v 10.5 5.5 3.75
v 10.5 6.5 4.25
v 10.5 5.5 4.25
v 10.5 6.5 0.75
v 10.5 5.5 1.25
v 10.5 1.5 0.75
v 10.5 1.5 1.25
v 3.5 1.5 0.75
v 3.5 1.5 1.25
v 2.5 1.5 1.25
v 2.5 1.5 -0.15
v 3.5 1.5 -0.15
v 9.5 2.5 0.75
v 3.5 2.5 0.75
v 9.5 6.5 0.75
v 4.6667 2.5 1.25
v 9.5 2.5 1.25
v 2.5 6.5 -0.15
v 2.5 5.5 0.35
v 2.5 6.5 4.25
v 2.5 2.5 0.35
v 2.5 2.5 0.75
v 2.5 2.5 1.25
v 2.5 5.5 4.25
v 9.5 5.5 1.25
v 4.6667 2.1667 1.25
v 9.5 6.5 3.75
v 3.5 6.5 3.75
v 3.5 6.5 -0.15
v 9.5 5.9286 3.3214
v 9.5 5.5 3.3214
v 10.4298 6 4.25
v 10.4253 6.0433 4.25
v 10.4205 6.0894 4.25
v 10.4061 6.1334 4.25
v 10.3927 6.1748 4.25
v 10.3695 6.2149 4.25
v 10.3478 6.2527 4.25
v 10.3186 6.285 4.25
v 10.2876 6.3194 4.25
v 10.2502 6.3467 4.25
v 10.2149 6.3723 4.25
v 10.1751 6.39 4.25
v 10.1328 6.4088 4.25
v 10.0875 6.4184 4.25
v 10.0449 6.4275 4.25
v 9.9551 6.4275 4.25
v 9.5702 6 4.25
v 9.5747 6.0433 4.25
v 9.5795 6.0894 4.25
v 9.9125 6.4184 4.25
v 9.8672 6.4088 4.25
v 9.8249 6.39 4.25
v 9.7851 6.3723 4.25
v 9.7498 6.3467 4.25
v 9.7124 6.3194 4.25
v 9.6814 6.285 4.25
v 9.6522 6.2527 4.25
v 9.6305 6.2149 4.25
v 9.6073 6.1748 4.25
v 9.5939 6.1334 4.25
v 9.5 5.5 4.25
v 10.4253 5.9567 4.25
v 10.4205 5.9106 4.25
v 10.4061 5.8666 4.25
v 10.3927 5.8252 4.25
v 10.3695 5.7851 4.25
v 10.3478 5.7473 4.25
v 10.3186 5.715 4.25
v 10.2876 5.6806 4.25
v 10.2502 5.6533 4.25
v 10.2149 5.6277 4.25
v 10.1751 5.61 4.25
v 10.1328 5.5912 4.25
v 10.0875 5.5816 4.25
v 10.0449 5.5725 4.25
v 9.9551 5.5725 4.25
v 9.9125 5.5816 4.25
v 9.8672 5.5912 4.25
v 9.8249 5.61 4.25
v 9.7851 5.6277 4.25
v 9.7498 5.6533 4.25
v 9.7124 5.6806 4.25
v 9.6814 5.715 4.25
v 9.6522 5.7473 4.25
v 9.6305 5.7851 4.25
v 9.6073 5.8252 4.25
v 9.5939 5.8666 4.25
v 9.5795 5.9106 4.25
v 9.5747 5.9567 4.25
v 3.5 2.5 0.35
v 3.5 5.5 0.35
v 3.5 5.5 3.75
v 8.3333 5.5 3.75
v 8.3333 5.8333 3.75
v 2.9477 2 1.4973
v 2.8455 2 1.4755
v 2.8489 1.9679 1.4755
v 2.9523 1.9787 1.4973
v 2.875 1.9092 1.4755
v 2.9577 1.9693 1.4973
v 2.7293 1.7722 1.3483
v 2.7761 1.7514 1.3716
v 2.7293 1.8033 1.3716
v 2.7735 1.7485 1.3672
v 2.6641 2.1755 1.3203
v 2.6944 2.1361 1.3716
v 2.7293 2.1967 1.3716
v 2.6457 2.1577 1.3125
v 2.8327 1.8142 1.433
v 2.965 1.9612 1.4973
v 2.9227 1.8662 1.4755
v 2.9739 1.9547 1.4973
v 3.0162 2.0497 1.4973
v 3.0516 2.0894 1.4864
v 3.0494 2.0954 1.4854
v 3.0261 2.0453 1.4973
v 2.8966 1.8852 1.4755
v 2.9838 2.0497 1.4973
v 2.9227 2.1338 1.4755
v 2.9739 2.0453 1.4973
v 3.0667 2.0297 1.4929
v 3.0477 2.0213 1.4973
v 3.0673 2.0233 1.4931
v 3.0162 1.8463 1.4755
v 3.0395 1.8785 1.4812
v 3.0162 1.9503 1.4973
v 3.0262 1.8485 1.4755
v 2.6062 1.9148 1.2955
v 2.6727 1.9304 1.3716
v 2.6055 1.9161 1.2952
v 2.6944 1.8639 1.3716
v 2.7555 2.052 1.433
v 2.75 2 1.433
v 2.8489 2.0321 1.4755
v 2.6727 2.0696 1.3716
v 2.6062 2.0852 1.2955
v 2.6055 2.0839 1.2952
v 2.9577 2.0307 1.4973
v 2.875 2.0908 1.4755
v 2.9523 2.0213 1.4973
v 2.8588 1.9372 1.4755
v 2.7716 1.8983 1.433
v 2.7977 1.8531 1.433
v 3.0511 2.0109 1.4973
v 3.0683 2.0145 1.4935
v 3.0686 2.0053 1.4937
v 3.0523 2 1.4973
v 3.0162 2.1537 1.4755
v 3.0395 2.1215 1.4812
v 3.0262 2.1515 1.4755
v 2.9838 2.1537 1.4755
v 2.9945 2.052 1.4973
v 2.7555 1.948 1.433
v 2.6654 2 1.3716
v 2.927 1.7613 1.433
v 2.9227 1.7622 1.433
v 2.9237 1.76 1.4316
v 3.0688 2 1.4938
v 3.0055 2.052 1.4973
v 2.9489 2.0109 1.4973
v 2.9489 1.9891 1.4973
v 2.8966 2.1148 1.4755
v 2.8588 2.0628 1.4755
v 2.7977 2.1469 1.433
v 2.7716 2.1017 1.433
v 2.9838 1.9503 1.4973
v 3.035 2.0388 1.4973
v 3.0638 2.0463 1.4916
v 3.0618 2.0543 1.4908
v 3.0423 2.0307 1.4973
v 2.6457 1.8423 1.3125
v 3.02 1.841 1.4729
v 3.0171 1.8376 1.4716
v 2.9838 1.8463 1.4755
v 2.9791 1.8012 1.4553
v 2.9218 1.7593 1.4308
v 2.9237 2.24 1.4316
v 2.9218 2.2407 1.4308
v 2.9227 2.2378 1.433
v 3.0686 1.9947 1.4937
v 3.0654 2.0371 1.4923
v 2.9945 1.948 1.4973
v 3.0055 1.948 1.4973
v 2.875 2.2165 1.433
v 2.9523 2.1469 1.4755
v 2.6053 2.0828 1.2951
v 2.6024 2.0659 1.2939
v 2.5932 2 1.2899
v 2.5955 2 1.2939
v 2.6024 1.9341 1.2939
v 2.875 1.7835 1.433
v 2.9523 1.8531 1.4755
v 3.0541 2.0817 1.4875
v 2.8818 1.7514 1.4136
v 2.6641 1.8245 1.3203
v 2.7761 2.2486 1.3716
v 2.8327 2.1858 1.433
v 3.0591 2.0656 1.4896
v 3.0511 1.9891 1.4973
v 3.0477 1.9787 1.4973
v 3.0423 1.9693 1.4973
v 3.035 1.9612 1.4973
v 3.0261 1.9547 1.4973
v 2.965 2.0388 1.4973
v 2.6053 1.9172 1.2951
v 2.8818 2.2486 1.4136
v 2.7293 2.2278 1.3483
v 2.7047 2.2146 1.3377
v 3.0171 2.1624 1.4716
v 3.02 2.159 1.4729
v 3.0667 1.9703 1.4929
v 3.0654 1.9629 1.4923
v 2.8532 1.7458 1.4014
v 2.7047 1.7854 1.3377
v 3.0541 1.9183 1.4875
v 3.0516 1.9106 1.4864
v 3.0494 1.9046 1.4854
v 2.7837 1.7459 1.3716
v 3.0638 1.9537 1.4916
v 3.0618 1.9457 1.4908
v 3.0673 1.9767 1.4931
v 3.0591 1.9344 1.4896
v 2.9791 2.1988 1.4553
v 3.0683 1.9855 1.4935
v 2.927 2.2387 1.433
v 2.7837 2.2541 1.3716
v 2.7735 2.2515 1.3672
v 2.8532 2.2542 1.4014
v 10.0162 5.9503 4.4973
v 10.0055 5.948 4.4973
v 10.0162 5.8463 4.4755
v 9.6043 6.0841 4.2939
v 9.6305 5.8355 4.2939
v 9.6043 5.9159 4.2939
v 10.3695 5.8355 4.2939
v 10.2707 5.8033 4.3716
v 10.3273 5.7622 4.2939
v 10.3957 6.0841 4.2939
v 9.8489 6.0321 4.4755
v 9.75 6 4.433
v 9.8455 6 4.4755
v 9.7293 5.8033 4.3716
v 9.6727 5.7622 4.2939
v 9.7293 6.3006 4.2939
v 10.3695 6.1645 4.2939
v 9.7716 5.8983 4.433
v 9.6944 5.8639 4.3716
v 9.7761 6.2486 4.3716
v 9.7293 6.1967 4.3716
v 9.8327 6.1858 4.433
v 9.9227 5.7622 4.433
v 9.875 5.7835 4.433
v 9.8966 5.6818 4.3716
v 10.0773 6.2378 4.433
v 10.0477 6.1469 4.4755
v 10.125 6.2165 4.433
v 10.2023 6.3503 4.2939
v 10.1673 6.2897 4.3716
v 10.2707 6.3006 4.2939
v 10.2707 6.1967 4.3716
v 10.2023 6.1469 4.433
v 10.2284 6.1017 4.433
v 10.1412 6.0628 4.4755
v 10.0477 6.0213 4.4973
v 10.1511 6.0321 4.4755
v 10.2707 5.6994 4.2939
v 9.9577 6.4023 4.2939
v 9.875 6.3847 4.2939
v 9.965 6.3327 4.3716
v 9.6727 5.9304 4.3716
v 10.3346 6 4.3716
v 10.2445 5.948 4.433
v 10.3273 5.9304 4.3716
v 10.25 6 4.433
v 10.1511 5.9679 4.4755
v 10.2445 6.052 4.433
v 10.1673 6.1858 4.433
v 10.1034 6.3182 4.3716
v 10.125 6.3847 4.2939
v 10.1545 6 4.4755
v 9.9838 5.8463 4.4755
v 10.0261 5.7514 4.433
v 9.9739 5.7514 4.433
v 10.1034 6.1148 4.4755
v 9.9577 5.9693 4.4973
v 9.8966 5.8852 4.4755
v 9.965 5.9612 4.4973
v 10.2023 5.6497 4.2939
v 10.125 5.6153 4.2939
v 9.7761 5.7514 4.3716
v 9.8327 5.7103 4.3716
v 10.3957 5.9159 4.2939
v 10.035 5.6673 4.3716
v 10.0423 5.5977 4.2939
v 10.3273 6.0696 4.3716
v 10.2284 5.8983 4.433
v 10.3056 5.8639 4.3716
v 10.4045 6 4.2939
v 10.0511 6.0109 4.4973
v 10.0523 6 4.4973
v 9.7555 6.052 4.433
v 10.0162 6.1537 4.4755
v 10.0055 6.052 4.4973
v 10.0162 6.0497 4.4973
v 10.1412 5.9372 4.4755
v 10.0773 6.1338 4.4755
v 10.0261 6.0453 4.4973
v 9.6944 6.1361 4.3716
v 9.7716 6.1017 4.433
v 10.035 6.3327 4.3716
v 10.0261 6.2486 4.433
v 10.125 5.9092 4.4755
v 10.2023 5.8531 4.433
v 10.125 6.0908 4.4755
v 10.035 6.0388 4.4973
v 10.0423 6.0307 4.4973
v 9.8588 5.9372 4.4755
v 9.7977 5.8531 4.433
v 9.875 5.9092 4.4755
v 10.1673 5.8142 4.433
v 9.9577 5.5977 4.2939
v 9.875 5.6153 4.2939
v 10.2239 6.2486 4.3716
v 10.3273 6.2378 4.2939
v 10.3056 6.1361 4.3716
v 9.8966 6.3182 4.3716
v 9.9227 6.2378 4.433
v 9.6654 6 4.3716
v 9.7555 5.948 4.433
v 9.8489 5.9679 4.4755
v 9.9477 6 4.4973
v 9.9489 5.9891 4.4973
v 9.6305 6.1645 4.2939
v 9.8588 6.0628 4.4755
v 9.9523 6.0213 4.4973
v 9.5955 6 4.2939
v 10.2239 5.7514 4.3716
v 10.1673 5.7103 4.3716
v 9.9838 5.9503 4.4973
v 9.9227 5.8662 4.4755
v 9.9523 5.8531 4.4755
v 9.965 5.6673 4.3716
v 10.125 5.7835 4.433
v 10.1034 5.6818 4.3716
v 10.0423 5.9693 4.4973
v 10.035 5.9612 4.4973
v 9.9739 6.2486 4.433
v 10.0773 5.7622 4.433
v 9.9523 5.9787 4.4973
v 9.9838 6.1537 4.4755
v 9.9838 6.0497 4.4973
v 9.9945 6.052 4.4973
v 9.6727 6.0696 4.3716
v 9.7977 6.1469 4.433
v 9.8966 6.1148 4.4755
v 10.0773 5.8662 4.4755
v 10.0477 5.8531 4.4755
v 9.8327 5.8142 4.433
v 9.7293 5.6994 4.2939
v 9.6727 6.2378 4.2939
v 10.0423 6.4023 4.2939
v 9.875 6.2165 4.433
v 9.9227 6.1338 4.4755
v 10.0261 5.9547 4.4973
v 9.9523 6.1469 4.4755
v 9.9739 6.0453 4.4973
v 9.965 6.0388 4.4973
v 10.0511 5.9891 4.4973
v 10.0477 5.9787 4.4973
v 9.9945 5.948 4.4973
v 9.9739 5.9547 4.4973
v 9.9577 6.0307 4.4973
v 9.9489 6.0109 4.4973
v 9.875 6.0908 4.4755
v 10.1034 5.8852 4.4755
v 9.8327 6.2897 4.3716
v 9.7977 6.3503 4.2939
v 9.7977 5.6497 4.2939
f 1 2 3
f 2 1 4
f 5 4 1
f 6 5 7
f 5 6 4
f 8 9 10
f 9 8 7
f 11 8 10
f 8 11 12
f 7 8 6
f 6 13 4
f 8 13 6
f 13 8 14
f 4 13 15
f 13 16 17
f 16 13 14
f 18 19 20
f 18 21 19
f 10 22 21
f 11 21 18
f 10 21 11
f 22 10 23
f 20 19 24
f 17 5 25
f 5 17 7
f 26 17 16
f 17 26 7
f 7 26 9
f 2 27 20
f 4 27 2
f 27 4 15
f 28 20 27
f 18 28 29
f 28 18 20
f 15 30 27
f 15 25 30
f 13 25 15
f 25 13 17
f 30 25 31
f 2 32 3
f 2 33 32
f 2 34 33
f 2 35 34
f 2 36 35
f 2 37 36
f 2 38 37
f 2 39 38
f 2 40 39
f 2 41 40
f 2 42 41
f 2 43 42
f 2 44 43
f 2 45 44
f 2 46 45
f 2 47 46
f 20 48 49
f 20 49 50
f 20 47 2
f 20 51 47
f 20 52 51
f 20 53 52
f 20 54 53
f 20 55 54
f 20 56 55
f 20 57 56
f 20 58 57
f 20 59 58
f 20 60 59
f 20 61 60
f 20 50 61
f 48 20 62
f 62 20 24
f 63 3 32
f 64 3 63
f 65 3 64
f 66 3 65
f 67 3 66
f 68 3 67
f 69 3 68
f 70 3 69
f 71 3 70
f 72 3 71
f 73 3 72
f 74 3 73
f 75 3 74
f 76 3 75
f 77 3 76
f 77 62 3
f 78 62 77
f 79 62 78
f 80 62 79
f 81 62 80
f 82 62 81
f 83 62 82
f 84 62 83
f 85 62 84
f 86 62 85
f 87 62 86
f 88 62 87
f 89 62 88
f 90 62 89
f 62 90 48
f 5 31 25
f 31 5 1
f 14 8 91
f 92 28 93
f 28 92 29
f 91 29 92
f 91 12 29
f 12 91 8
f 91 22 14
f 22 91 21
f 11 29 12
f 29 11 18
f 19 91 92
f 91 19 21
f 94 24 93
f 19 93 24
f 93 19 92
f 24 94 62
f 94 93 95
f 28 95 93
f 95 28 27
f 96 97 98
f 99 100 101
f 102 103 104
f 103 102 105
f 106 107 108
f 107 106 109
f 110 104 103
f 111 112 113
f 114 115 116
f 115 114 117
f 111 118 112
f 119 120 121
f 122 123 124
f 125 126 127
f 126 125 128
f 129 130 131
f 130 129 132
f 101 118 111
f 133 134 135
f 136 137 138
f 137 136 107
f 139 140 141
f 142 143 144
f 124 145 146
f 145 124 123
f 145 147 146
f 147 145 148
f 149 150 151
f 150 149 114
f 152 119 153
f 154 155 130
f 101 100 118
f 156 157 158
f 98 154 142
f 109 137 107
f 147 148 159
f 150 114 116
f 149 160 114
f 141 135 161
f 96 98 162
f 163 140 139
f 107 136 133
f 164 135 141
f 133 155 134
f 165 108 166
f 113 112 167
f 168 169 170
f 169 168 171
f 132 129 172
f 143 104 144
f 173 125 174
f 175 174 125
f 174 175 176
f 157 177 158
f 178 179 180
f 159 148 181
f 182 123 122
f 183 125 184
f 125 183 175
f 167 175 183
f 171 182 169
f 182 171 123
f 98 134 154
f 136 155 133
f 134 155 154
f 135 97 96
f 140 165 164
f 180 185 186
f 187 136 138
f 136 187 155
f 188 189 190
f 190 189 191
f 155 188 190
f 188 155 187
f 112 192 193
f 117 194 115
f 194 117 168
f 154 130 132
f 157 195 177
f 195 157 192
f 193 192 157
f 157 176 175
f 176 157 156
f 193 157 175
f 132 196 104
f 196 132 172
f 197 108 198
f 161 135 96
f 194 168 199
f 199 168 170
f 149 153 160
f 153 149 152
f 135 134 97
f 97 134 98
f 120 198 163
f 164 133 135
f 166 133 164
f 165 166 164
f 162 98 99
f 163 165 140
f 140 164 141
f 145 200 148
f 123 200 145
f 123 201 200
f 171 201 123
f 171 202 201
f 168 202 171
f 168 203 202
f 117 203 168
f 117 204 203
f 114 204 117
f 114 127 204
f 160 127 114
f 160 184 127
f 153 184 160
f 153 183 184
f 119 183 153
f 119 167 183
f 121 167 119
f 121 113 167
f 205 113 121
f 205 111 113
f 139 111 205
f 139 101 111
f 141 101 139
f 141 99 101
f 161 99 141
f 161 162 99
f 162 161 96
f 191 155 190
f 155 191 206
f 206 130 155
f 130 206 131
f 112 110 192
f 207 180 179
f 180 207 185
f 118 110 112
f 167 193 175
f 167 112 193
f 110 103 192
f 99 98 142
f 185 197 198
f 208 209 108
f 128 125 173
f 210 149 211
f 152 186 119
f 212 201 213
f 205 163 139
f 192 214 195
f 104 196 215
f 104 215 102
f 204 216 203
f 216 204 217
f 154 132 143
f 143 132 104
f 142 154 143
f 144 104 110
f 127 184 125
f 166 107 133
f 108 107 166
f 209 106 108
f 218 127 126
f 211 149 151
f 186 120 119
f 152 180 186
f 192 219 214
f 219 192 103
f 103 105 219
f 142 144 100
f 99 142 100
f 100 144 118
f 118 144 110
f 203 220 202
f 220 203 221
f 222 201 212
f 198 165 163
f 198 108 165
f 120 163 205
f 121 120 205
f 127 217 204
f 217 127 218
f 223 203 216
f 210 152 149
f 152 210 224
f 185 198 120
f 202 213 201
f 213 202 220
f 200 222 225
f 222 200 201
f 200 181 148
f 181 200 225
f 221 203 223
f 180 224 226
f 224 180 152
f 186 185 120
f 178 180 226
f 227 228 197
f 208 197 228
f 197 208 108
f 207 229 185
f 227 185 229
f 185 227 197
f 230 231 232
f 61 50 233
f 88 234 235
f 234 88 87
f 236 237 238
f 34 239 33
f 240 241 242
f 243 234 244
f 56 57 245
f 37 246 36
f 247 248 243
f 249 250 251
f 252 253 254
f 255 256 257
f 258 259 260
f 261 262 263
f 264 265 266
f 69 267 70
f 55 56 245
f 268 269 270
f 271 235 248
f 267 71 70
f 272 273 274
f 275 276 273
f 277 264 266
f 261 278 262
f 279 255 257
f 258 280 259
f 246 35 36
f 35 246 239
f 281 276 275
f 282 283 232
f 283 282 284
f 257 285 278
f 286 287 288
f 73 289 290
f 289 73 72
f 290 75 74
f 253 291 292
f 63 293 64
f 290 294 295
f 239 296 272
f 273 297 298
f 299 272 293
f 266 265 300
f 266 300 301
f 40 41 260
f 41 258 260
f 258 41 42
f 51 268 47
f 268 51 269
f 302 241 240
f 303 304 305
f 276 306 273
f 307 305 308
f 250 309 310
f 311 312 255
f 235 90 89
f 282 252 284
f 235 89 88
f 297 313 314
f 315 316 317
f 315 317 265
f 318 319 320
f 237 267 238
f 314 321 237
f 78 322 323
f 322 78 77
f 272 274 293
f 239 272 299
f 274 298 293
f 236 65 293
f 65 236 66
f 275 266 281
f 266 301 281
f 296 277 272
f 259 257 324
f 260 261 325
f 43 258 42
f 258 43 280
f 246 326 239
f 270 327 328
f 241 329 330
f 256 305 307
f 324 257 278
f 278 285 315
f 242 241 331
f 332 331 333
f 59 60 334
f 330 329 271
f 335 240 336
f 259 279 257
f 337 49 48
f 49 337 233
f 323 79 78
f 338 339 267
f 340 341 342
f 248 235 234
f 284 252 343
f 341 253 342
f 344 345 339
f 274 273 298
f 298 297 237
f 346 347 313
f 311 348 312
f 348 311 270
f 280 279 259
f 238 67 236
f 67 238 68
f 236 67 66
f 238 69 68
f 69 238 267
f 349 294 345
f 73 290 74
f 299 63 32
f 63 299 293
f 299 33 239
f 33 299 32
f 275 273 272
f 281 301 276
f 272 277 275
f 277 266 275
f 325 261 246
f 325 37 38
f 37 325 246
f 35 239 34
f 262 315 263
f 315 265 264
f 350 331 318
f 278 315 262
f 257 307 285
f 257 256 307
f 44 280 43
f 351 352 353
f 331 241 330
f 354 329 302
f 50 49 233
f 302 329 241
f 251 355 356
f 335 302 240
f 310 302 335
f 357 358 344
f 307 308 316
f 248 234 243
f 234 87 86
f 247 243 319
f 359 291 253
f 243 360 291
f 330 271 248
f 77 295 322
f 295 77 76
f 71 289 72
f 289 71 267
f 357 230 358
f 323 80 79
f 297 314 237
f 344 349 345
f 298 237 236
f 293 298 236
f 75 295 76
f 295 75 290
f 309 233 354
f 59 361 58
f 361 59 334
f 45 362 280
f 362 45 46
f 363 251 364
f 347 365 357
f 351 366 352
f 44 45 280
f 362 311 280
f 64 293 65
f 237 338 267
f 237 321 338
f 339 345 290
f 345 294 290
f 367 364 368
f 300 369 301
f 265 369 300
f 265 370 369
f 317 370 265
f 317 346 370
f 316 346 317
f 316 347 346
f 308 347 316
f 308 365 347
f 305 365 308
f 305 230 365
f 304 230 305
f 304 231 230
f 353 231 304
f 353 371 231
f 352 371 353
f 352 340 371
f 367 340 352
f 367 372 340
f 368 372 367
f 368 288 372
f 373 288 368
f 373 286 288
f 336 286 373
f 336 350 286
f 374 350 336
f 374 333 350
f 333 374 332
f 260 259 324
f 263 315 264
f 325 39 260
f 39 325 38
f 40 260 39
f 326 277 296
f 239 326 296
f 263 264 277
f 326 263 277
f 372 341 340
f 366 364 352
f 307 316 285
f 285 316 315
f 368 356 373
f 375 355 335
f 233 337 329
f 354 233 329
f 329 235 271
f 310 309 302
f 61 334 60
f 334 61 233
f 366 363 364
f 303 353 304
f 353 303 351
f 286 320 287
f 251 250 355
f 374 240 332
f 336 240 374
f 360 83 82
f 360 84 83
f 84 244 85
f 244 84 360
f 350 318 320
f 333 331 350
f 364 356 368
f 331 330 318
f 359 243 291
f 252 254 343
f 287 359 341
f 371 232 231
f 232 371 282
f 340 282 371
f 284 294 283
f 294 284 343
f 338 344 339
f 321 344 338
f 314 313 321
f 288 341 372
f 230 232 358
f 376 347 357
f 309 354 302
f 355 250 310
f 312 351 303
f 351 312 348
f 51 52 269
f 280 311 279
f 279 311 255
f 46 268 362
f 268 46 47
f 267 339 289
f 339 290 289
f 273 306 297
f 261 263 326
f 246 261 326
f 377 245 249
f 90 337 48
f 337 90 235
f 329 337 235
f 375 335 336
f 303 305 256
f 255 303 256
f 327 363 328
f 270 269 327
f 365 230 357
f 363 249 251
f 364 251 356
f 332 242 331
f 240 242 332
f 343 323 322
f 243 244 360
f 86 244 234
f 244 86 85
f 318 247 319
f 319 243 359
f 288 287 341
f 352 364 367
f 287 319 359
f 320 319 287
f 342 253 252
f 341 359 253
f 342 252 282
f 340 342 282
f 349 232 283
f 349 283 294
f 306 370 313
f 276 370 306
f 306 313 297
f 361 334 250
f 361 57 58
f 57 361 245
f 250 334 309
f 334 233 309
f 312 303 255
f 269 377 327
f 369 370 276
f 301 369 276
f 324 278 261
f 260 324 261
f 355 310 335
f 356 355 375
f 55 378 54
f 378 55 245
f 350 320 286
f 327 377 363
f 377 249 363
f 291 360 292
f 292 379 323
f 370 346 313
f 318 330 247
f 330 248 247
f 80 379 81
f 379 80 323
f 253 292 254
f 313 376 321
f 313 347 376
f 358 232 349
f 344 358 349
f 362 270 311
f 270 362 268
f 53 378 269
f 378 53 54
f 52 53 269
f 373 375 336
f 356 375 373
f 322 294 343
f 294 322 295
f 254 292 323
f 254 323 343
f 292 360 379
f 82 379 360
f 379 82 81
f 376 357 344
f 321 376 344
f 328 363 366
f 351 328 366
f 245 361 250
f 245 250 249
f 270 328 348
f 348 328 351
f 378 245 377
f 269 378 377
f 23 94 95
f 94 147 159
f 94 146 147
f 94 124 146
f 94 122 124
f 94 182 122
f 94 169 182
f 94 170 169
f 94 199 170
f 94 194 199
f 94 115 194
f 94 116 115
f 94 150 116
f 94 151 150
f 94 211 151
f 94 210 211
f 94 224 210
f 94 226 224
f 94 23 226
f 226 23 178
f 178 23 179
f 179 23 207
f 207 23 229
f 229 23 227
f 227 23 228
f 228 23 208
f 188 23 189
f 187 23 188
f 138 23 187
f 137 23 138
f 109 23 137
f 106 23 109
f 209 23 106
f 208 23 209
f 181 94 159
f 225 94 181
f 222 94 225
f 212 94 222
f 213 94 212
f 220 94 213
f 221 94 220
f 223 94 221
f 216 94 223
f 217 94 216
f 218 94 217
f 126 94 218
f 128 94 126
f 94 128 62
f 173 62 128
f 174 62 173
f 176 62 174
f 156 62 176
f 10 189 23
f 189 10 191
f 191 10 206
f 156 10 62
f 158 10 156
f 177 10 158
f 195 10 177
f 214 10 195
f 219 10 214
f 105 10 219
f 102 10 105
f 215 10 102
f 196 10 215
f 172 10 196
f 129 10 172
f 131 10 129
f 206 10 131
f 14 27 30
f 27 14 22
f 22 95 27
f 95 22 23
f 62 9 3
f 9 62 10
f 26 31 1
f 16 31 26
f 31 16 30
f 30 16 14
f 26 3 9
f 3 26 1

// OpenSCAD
use <../polychannel.scad>

$fn=30;
small_number = 1e-6;

function cs(size, position, ang=[0, [0,0,1]]) = cube_shape(size, position, ang);

chan_width = 1.0;
chan_height = 0.5;
chan_unit_size = [chan_width, chan_width, chan_height];

function channel_segment_spec(x=0.0, y=0.0, z=0.0) = [x, y, z];
function _element_wise_multiplication(a, b) = [a[0] * b[0], a[1] * b[1], a[2] * b[2]];
function _mult(a, b) = _element_wise_multiplication(a, b);
// Recursively sum elements of a list such as [[0, 1, 2], [3, 4, 5], [6, 7, 8]]
// which is [9, 12, 15].
function _sumlist(list, c = 0) = 
    c < len(list) - 1 ? 
        list[c] + _sumlist(list, c + 1) 
        :
        list[c];
// A valid set of relative intermediate points must sum to [1, 1, 1]
function check_relative_intermediate_points(pnts) =
    let (diff = _sumlist(pnts) - [1, 1, 1])
    let (xdiff = abs(diff[0]))
    let (ydiff = abs(diff[1]))
    let (zdiff = abs(diff[2]))
    (xdiff < small_number) && (ydiff < small_number) && (zdiff < small_number);
    

echo();
echo(_sumlist([[0, 1, 2], [3, 4, 5], [6, 7, 8]]));
echo();

pA = [3, 2, 1];
pB = [10, 6, 4];

_r = 0.5;
color("red") translate(pA) sphere(r=_r);
color("green") translate(pB) sphere(r=_r);

params_1 = [
    cs(chan_unit_size, pA),      // This gives pA as the starting position
    cs(chan_unit_size, pB - pA)  // Must specify relative position
];
color("orange") polychannel(params_1);

echo();
echo(_element_wise_multiplication(channel_segment_spec(x=1), [1, 1, 1]));
echo(_mult(channel_segment_spec(x=1), [1, 1, 1]));

delta_p = pB - pA;
params_2 = [
    cs(chan_unit_size, pA),
    cs(chan_unit_size, _mult(channel_segment_spec(x=1), delta_p)),
    cs(chan_unit_size, _mult(channel_segment_spec(y=1), delta_p)),
    cs(chan_unit_size, _mult(channel_segment_spec(z=1), delta_p)),
];
polychannel(params_2);

module connect_points(pA, pB, segment_specs, clr="cornflowerblue") {
    // echo(_sumlist(segment_specs));
    // echo(check_relative_intermediate_points(segment_specs));
    assert(
        check_relative_intermediate_points(segment_specs), 
        "Relative intermediate points must sum to [1,1,1]"
    );
    delta_p = pB - pA;
    params = [
        for (i=[0:1:len(segment_specs)]) i==0 ?
            cs(chan_unit_size, pA)
            :
            cs(chan_unit_size, _mult(segment_specs[i-1], delta_p))
            
    ];
    // echo(params);
    color(clr) polychannel(params);
}


relative_intermediate_points = [
    channel_segment_spec(z=-0.3),
    channel_segment_spec(y=1),
    channel_segment_spec(z=1.3),
    channel_segment_spec(x=1),
];
echo();
echo(_sumlist(relative_intermediate_points));
echo(check_relative_intermediate_points(relative_intermediate_points));
echo();
connect_points(pA, pB, relative_intermediate_points);

// // These relative itermediate points do not sum to [1,1,1]
// bad_intermediate_points = [
//     channel_segment_spec(z=-0.4),
//     channel_segment_spec(y=1),
//     channel_segment_spec(z=1.3),
//     channel_segment_spec(x=1),
// ];
// echo();
// echo("bad_intermediate_points", bad_intermediate_points);
// echo("_sumlist", _sumlist(bad_intermediate_points));
// echo(check_relative_intermediate_points(bad_intermediate_points));
// echo(-1, abs(-1));
// echo(small_number);
// echo();
// connect_points(pA, pB, bad_intermediate_points);
